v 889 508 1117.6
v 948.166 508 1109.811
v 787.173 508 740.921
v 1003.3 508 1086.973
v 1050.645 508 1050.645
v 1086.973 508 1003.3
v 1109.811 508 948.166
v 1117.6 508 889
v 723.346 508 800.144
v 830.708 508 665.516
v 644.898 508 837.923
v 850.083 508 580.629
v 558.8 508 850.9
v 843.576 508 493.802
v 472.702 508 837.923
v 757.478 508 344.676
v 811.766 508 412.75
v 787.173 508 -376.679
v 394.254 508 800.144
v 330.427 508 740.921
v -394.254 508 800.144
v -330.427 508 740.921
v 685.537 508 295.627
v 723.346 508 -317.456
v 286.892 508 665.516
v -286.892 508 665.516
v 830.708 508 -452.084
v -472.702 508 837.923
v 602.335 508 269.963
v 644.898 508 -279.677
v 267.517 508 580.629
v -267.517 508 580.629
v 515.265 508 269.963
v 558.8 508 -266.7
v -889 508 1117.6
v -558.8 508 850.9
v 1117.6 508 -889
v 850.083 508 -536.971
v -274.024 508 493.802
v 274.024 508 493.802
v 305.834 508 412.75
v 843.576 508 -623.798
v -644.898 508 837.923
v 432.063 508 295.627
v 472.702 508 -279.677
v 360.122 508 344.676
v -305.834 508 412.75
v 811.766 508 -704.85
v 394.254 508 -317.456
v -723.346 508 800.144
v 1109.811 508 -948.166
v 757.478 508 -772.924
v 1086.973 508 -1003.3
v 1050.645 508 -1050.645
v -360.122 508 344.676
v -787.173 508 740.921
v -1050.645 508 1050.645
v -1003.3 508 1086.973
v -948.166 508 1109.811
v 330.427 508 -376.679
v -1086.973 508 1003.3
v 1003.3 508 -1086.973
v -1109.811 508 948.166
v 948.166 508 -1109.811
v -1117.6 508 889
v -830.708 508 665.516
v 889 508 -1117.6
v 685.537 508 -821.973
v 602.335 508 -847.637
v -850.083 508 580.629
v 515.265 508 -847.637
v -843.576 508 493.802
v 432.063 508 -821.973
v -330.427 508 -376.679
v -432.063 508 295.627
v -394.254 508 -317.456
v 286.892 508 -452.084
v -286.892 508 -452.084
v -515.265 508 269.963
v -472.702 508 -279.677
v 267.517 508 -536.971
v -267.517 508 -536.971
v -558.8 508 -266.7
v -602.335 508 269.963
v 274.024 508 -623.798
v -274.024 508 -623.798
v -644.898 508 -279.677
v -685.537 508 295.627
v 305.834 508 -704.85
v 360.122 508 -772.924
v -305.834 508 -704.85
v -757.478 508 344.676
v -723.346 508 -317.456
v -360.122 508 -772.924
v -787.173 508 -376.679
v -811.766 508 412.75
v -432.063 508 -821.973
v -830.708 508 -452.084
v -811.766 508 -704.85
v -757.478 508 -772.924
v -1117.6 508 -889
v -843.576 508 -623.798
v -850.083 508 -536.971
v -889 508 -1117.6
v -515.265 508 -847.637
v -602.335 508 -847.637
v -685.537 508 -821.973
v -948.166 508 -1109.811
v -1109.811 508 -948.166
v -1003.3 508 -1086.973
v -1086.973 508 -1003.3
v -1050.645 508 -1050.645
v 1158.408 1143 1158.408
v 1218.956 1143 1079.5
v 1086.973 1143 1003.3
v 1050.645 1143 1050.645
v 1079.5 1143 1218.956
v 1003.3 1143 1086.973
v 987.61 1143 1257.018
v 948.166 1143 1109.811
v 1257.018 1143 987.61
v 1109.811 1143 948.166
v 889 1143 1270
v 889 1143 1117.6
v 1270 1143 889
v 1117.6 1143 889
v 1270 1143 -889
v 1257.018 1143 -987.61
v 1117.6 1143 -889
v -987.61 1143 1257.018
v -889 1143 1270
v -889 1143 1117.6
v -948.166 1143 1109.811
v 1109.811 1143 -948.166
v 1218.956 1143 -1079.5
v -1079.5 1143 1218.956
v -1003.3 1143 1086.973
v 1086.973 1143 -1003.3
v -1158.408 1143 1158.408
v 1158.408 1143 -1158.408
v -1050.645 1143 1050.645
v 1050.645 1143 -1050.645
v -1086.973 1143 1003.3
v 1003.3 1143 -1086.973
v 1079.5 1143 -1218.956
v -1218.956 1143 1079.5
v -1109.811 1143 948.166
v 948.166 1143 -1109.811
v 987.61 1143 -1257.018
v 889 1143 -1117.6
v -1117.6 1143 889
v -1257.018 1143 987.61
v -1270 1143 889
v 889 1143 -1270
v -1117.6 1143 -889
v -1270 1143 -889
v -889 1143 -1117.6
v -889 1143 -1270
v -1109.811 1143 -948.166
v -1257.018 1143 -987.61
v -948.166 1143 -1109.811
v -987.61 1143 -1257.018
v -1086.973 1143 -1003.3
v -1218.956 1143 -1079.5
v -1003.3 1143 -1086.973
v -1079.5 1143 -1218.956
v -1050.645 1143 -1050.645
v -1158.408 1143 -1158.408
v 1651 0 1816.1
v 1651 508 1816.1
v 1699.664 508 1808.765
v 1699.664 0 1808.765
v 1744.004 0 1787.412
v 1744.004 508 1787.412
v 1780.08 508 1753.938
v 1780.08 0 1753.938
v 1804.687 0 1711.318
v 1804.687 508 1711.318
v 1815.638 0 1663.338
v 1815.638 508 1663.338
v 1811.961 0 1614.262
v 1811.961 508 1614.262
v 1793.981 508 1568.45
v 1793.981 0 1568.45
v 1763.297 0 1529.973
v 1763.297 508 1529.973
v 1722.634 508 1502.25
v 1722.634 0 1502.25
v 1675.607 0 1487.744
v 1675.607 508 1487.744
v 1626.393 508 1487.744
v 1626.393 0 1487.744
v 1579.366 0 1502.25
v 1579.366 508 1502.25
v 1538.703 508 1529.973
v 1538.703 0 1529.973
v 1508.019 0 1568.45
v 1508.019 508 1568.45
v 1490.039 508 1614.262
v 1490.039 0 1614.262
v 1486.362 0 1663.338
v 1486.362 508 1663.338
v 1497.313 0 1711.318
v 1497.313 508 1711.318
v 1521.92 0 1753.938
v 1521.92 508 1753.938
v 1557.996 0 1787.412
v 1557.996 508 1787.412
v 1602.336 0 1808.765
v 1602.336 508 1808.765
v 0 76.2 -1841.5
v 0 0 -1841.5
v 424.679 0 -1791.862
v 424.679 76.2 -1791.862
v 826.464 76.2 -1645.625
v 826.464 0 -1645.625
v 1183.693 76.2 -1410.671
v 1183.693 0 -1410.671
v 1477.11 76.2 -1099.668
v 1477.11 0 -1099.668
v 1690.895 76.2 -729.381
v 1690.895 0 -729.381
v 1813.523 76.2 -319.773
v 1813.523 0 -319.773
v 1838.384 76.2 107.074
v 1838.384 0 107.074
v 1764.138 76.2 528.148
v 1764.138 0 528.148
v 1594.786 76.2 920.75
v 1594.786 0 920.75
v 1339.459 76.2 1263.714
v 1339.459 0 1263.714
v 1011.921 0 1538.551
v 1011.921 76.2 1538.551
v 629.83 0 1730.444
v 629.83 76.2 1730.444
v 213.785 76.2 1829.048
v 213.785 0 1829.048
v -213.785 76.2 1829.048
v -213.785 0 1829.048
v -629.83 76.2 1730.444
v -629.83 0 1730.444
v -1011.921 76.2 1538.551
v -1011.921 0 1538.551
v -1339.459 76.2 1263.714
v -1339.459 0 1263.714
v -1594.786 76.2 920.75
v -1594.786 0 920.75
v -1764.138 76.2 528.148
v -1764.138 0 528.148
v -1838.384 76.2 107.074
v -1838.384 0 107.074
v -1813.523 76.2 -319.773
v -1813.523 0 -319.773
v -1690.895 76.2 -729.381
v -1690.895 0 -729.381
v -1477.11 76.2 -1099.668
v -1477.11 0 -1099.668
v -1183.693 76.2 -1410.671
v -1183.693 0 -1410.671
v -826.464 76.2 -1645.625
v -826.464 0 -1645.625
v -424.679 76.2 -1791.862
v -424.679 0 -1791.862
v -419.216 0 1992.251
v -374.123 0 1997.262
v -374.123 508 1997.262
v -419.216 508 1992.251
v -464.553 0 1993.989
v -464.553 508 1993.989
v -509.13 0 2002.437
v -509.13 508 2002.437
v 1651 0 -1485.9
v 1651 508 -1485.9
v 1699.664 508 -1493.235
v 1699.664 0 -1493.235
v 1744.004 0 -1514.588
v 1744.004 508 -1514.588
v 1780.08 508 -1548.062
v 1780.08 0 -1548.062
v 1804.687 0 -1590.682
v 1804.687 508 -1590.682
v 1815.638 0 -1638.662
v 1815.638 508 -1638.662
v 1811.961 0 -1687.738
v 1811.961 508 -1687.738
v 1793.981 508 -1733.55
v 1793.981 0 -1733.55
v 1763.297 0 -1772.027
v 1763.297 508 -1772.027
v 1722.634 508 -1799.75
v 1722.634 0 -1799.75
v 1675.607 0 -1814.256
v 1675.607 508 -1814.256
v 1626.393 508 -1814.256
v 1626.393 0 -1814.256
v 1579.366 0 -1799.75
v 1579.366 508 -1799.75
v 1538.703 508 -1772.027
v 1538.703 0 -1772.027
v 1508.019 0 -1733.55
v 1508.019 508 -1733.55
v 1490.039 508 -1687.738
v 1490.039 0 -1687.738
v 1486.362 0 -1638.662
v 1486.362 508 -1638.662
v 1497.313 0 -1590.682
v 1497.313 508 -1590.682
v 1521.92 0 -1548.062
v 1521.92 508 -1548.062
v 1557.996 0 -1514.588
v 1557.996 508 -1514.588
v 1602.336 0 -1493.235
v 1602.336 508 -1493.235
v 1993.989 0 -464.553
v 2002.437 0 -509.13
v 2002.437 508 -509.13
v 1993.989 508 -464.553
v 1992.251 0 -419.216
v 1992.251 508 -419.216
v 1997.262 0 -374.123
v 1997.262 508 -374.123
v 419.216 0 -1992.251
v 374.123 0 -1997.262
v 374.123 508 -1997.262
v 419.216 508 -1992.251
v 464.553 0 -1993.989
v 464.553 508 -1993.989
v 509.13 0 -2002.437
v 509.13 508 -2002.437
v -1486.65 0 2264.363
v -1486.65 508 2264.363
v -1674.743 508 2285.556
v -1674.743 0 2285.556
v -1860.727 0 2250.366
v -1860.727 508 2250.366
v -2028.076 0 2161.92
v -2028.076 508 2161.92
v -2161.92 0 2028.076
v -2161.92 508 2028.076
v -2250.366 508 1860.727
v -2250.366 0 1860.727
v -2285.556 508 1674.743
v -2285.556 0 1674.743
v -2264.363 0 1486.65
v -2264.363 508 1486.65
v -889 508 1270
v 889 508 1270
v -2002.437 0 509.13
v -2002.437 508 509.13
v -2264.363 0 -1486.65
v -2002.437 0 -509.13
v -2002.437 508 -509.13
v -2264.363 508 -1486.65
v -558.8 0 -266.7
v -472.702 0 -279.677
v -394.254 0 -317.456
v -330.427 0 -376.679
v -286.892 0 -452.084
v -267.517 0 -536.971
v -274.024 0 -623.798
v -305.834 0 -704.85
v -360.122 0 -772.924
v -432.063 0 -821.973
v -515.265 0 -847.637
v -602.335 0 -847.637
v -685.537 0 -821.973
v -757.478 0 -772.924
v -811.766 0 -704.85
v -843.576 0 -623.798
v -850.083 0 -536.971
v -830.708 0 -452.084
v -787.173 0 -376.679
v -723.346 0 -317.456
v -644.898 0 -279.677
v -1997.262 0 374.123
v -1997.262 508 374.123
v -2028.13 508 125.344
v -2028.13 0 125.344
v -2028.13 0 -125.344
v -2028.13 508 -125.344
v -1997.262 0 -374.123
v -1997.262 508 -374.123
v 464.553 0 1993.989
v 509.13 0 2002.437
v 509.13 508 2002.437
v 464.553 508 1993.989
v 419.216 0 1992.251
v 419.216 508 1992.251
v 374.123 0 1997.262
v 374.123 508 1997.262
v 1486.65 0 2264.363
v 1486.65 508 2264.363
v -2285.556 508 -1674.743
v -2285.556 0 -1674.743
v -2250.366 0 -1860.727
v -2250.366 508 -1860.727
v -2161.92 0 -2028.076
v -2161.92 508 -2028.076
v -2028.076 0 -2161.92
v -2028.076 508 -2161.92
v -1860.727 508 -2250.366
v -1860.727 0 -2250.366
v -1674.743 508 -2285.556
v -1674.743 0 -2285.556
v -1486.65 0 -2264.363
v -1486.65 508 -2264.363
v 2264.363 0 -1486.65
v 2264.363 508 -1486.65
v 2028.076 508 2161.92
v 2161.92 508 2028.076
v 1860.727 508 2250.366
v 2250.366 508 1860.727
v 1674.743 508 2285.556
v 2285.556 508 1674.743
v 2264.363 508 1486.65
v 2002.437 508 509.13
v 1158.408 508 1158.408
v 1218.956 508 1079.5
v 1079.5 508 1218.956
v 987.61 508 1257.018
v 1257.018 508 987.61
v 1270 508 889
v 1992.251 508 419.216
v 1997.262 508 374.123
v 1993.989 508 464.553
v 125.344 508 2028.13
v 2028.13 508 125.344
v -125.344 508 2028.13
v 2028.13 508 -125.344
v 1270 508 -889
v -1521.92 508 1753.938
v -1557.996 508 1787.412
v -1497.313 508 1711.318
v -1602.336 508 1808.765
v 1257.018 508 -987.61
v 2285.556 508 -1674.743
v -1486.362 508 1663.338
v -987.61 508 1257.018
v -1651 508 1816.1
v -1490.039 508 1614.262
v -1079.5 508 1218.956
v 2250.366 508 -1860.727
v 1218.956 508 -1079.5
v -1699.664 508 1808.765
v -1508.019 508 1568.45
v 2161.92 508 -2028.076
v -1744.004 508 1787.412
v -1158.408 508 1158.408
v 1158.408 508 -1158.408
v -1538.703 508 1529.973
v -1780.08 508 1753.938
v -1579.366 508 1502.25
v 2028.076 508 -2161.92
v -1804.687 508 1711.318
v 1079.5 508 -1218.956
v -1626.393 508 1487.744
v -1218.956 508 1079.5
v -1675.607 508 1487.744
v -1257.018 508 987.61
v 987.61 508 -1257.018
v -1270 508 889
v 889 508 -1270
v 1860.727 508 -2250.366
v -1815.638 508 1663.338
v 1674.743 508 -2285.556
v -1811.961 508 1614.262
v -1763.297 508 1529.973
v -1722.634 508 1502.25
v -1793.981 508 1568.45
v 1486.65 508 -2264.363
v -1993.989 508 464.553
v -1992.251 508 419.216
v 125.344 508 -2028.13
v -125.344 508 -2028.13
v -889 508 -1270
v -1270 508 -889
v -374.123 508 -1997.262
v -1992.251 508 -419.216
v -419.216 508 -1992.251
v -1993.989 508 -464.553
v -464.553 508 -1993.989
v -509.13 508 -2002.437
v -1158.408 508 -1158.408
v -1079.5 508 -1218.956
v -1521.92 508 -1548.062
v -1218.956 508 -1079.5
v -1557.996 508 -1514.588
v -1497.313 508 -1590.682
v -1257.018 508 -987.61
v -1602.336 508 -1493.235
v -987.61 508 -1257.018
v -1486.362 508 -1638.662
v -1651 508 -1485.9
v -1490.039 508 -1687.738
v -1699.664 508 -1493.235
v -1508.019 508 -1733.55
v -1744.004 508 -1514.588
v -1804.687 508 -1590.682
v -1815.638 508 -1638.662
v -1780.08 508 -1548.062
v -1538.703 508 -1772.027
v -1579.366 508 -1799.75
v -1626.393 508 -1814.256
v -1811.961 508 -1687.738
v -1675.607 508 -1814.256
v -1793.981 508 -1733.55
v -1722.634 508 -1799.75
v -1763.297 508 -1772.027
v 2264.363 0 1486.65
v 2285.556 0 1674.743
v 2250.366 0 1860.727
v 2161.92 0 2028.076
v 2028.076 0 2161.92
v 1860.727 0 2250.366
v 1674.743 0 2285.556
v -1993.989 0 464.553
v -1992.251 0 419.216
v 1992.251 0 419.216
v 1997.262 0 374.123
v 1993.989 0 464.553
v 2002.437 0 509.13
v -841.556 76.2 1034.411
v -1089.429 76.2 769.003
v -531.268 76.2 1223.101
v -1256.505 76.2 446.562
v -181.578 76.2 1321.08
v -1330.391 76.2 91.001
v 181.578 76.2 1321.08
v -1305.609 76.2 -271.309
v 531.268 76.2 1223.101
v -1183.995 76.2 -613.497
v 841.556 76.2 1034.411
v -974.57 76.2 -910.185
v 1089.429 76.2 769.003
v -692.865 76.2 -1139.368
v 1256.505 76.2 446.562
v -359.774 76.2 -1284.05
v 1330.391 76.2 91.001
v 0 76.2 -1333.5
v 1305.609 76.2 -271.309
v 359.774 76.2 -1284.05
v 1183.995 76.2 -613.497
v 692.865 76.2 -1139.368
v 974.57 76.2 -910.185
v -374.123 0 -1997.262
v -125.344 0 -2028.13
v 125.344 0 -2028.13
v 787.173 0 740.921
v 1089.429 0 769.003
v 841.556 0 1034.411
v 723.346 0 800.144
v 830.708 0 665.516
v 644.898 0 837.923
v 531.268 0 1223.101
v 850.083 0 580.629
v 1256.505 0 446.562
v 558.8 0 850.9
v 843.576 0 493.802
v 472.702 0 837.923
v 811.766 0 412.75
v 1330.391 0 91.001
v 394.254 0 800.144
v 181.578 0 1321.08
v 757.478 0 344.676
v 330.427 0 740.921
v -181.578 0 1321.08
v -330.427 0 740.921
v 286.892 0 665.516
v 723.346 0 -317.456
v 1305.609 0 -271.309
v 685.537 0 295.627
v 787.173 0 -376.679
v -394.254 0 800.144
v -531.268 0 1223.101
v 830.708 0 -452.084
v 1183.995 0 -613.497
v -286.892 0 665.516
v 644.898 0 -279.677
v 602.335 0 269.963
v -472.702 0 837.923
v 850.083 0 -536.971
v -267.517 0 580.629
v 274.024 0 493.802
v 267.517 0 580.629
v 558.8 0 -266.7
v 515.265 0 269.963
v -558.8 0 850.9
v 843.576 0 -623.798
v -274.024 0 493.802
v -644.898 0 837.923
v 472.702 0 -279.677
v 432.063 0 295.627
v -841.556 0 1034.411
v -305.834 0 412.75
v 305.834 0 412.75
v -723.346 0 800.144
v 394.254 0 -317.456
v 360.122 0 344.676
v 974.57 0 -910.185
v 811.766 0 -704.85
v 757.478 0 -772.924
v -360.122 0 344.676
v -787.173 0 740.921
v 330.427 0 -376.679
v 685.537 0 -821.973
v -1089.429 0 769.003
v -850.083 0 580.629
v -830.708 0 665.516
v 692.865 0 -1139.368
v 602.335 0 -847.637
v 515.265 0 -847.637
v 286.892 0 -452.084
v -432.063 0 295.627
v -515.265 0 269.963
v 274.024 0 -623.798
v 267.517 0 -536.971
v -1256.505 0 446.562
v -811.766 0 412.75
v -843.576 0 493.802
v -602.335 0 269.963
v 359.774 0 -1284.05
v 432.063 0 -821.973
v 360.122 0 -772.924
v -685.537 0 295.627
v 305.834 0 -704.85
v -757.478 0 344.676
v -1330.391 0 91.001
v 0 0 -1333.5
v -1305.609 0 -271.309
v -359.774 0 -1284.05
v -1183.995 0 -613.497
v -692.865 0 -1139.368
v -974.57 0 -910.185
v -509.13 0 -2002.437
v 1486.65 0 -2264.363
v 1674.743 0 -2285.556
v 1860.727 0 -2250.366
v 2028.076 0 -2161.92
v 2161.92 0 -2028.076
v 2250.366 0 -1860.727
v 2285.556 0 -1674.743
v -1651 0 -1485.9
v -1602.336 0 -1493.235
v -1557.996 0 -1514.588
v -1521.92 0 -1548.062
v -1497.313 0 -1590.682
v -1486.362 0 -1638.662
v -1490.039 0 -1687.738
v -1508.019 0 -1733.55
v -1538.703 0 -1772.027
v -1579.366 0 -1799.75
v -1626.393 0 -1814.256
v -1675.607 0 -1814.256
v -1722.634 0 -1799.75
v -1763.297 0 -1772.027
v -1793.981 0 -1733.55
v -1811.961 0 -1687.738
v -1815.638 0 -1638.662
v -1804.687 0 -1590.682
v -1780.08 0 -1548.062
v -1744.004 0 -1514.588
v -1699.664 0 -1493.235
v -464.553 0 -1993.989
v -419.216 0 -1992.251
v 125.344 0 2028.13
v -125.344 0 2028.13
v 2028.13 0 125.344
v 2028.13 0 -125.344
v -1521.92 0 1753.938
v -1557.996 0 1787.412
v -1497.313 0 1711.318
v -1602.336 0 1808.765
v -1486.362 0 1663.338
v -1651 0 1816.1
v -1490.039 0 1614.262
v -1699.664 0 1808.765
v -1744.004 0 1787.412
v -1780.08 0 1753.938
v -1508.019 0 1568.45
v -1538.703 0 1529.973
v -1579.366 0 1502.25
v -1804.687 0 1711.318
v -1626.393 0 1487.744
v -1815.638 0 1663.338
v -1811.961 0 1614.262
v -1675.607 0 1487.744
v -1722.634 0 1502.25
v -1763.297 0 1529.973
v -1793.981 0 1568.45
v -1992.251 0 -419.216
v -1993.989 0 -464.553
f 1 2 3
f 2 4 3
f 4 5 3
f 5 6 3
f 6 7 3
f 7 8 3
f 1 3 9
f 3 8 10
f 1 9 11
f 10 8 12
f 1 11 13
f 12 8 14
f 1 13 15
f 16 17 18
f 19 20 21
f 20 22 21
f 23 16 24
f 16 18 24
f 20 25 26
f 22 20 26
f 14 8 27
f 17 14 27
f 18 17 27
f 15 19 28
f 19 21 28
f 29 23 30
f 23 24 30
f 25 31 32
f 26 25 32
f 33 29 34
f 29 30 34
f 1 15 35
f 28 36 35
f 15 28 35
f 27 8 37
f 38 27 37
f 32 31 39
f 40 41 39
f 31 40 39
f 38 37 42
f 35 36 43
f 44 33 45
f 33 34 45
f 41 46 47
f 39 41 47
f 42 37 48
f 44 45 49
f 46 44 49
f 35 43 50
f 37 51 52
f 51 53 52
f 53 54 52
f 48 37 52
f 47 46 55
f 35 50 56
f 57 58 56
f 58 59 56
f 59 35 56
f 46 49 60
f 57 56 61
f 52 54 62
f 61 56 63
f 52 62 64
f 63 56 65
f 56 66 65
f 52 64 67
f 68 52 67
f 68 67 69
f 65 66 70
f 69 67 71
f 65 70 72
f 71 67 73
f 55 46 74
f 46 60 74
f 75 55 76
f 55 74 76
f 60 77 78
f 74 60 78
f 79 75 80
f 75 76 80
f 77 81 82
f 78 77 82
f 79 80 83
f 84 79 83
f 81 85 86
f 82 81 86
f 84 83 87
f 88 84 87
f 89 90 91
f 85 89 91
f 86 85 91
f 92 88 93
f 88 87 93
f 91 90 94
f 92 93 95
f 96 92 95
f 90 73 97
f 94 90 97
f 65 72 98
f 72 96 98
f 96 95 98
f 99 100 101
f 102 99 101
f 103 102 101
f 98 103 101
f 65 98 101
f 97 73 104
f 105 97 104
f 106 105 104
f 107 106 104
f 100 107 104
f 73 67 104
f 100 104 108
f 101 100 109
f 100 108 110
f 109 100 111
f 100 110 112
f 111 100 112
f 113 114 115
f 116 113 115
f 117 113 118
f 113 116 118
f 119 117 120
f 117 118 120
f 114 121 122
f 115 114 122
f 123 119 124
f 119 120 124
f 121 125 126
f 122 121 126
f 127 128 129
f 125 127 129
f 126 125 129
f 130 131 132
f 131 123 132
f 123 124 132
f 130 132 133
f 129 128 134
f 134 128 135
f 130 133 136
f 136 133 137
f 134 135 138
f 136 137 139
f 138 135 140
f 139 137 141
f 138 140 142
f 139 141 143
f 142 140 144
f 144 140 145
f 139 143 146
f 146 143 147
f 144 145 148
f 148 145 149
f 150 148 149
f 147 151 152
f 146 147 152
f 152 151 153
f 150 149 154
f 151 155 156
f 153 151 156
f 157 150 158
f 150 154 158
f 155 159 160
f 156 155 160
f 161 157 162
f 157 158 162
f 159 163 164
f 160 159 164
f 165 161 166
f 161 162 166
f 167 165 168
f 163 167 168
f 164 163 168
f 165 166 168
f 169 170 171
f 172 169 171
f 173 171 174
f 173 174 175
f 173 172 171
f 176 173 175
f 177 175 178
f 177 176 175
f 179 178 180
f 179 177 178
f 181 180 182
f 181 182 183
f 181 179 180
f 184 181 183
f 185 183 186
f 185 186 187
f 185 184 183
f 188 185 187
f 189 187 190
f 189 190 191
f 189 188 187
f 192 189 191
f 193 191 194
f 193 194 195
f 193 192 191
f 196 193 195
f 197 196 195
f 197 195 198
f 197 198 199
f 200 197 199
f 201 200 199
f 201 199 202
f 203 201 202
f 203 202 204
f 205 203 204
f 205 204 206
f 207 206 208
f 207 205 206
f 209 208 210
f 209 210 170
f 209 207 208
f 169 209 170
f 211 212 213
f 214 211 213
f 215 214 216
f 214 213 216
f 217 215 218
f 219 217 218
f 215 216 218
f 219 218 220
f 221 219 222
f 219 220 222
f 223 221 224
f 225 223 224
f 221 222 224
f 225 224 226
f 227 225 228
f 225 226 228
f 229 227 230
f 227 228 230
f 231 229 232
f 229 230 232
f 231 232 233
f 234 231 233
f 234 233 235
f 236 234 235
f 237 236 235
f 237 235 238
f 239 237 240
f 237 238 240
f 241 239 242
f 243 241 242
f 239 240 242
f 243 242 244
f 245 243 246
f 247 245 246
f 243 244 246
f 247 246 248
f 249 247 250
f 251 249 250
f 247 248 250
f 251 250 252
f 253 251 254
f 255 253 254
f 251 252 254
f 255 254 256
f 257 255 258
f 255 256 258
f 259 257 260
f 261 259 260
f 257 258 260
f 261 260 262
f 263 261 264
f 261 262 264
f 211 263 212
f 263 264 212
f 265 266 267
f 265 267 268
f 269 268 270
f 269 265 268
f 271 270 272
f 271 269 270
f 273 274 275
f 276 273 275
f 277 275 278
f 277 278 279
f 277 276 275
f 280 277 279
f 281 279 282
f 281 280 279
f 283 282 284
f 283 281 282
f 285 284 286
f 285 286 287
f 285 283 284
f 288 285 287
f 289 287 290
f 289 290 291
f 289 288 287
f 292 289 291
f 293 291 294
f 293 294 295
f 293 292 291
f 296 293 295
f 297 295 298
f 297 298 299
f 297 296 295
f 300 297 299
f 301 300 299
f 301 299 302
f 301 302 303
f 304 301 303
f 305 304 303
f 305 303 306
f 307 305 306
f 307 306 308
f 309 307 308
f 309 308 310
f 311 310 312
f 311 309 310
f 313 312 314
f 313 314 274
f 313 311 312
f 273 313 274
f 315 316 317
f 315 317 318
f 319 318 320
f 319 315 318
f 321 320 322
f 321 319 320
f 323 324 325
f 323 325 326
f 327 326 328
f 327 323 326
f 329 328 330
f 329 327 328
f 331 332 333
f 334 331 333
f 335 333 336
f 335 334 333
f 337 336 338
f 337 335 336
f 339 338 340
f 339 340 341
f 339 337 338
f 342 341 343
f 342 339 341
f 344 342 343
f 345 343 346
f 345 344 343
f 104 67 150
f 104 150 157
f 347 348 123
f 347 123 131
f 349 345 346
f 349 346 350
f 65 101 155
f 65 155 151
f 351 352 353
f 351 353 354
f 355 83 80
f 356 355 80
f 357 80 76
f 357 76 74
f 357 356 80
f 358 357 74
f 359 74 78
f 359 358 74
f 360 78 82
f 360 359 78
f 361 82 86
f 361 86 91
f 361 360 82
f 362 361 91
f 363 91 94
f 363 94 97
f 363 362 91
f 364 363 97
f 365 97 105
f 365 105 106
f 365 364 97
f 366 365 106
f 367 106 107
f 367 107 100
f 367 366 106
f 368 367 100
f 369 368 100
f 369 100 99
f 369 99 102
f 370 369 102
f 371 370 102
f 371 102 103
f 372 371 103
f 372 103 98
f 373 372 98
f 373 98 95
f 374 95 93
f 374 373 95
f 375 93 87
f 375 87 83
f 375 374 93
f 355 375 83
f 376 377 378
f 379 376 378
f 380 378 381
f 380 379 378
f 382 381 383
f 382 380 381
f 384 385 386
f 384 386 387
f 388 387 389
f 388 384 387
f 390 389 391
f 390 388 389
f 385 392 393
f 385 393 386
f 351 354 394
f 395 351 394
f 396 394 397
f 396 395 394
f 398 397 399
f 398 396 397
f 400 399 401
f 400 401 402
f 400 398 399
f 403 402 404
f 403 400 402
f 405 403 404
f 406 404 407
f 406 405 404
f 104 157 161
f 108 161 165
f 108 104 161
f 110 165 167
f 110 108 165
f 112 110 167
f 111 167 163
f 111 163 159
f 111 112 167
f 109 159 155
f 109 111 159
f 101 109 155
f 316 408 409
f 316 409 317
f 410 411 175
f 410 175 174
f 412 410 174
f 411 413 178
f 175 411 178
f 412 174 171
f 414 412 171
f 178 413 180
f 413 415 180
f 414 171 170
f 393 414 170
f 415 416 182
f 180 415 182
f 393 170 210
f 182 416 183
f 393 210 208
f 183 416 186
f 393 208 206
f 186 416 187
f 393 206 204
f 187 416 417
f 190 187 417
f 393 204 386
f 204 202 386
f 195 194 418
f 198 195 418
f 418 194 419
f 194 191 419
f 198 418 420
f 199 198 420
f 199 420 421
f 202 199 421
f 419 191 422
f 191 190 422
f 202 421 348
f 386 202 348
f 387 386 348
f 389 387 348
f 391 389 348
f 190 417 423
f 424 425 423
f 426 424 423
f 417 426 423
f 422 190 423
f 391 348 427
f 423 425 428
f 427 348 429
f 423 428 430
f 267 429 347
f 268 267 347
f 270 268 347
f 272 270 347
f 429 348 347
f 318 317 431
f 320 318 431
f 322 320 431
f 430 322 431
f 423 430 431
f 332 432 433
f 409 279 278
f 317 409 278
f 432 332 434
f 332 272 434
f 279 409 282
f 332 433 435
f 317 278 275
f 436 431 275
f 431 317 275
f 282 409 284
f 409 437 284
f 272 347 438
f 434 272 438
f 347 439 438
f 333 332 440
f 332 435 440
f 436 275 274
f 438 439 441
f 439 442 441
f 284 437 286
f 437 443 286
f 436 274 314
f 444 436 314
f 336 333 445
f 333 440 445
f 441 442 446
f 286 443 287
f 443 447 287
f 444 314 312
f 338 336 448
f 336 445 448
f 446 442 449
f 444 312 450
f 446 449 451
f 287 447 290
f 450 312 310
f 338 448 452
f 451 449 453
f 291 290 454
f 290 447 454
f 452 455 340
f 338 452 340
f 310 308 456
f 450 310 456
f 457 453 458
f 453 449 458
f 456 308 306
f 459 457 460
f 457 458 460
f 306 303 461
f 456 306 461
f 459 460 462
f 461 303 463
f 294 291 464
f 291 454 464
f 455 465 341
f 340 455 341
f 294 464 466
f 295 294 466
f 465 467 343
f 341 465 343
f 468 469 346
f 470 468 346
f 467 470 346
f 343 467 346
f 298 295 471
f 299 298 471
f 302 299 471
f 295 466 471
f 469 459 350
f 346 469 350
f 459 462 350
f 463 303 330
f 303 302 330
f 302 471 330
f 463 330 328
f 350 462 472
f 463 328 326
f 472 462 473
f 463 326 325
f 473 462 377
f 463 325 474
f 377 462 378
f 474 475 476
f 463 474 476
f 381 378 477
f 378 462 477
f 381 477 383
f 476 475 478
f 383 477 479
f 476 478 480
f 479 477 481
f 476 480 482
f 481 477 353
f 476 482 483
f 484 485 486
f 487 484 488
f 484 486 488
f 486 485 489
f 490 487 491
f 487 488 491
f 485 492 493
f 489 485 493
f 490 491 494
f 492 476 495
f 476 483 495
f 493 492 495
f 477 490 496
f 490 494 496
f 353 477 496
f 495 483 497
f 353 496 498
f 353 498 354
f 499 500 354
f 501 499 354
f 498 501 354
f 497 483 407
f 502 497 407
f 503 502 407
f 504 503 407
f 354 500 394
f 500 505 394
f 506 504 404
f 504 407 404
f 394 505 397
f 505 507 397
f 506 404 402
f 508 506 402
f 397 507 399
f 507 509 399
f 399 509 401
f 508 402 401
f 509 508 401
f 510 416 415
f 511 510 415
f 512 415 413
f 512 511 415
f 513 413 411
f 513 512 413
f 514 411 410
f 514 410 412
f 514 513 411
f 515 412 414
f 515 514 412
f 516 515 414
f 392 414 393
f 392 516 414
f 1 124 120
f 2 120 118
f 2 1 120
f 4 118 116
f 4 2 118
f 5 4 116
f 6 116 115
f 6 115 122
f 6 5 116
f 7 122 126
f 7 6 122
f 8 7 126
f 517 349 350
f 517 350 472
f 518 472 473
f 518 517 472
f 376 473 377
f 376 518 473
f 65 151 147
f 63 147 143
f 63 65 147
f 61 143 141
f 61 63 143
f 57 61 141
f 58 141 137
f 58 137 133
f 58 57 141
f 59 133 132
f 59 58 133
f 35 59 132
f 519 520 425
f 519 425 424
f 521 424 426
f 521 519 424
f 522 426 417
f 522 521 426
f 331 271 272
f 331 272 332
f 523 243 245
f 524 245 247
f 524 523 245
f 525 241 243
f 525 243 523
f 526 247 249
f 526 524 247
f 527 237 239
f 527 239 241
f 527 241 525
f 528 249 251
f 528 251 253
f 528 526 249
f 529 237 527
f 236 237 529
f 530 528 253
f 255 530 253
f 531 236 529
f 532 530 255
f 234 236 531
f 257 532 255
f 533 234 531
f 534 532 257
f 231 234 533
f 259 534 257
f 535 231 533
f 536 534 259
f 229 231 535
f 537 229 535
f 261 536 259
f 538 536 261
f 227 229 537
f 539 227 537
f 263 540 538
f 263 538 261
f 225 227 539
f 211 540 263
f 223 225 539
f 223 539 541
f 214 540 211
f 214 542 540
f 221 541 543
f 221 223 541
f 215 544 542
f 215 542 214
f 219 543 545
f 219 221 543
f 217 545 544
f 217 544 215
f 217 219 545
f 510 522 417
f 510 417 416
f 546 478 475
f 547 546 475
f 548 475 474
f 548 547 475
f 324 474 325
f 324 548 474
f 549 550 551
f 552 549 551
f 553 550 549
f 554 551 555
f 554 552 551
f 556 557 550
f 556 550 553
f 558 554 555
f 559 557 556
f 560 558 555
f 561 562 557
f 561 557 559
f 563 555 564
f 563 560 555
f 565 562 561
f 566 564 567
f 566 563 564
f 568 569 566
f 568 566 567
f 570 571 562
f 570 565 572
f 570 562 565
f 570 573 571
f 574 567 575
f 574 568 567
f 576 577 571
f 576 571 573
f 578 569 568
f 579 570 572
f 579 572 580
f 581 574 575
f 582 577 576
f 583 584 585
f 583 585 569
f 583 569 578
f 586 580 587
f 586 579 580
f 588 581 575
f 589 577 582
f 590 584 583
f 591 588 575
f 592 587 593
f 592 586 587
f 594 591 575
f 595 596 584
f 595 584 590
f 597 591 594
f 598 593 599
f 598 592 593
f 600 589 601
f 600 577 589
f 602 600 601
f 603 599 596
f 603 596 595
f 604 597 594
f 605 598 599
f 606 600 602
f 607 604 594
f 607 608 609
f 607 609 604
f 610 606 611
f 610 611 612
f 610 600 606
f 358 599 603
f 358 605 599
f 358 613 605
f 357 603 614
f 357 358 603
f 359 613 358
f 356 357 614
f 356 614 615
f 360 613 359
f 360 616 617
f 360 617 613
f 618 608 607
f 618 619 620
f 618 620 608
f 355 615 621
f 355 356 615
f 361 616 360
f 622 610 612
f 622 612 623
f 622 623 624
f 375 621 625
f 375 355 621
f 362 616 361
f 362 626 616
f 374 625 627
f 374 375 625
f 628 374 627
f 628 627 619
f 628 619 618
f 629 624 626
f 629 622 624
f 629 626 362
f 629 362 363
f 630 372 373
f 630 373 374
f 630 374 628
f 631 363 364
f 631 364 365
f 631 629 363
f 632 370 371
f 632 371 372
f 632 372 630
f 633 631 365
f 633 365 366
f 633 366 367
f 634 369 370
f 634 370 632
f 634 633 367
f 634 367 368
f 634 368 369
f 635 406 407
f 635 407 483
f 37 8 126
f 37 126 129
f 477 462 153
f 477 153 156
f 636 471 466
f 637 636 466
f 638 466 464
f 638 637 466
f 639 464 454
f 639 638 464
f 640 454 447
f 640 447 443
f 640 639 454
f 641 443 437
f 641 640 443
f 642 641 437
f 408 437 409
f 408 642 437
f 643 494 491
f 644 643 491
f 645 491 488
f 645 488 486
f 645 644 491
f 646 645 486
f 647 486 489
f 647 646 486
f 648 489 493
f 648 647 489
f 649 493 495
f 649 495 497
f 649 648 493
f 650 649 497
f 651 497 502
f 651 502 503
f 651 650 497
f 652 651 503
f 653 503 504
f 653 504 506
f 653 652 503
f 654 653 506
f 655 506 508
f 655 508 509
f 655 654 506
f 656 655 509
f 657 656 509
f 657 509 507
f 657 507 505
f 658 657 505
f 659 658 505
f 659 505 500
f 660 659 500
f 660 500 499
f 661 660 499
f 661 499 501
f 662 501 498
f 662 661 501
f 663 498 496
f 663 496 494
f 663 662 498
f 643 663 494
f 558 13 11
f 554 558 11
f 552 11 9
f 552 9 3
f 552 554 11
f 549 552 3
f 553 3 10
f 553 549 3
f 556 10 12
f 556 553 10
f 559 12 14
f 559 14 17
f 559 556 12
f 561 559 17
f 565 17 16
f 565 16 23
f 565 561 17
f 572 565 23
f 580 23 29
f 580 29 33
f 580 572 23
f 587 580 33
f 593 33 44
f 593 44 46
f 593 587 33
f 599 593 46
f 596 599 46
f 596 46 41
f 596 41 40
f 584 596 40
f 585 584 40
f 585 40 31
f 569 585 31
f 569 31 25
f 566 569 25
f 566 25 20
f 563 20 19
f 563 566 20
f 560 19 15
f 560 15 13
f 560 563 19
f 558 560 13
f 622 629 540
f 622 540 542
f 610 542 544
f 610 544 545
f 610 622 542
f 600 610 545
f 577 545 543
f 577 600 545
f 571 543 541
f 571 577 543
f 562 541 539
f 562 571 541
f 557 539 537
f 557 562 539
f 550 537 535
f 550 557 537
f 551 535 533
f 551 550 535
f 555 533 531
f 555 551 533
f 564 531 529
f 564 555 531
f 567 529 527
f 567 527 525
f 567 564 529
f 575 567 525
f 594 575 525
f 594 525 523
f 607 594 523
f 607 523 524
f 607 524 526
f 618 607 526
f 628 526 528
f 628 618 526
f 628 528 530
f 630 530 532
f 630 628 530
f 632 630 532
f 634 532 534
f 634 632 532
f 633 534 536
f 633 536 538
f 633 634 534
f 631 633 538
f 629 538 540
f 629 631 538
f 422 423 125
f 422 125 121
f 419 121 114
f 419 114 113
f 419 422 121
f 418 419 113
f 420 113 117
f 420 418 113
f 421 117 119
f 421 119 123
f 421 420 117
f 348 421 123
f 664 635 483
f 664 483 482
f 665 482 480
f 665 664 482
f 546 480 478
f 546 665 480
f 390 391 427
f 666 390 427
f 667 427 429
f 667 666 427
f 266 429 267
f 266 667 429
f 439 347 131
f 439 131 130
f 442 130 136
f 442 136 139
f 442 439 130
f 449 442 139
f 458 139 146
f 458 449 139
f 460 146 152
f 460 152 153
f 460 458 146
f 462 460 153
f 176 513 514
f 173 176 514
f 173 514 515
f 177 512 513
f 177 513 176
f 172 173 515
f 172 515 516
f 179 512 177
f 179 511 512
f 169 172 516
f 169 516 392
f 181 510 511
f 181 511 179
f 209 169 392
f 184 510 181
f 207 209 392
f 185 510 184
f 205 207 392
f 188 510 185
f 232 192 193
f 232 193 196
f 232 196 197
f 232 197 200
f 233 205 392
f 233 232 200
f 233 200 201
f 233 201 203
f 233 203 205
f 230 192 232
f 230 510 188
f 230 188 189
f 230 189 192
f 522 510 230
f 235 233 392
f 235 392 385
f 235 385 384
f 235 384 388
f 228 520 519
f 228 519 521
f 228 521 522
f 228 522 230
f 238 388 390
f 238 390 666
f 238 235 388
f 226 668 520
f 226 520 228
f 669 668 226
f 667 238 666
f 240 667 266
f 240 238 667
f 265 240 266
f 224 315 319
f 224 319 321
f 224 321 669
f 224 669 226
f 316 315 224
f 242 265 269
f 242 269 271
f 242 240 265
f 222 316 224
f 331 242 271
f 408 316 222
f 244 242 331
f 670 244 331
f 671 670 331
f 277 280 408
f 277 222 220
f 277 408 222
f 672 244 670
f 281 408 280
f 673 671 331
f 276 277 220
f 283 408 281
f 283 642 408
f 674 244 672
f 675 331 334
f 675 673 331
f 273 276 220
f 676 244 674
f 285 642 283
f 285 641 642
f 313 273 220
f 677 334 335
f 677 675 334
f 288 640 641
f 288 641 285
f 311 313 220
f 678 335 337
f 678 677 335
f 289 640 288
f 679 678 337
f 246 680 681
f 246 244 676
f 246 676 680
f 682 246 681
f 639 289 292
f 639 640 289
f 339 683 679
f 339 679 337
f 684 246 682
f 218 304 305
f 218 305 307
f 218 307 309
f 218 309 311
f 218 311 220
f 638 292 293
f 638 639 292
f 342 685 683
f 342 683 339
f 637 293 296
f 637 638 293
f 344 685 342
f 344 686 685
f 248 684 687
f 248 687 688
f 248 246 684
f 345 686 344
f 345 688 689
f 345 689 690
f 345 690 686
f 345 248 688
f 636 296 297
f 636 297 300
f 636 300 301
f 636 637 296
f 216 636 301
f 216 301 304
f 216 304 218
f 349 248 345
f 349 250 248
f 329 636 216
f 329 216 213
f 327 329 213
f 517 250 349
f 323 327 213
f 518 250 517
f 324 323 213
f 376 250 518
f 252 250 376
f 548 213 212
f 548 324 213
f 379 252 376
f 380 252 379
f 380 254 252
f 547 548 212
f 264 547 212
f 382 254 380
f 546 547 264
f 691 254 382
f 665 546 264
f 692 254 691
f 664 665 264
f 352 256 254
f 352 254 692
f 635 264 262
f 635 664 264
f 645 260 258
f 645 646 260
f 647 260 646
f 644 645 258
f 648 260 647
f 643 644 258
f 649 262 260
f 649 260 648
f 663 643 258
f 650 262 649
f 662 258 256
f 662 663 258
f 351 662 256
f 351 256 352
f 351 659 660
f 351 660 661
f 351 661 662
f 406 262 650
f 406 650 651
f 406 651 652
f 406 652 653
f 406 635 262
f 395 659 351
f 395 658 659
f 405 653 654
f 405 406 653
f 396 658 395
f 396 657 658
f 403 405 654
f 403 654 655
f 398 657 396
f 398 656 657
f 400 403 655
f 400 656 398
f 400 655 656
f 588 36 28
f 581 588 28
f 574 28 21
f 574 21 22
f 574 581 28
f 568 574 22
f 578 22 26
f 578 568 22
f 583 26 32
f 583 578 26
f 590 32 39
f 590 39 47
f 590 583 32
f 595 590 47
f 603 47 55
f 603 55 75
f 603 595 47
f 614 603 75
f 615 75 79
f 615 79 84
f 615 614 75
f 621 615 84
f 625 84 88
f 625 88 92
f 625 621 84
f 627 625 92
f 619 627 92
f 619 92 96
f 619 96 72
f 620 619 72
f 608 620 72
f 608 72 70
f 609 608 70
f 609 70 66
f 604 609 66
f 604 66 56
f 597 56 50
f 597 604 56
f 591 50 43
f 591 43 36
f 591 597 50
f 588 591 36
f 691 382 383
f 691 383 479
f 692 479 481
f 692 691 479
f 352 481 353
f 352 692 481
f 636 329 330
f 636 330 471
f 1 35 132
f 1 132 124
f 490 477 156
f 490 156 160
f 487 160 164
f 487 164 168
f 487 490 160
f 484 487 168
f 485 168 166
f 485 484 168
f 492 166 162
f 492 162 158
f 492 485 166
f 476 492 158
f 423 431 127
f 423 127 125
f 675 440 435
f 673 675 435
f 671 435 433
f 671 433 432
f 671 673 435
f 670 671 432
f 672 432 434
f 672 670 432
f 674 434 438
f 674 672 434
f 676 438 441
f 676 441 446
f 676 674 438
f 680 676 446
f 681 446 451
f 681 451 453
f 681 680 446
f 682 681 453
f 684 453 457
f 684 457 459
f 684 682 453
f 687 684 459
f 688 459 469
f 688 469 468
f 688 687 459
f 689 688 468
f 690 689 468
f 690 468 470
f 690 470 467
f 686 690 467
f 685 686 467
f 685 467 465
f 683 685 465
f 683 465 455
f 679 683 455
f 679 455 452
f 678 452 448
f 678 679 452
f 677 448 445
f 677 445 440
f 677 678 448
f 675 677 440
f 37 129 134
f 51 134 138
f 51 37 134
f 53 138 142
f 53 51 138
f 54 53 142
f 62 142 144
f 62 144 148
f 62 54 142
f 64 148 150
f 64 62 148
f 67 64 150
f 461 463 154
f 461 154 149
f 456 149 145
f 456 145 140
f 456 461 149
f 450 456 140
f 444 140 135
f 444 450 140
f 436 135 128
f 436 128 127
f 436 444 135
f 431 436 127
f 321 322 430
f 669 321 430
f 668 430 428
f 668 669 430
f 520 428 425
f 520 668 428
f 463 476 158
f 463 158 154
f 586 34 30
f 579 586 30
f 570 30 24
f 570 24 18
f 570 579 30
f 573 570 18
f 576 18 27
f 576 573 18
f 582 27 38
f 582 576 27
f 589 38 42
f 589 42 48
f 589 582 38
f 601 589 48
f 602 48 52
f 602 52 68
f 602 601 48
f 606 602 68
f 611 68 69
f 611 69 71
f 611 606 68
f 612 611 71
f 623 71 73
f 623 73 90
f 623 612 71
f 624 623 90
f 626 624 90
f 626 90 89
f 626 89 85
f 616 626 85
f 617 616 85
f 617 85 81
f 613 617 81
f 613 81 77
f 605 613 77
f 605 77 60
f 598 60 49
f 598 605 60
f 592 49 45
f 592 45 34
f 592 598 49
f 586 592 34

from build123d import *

# Parameters (mm, degrees)
SKETCH1_R           = 292.1
SKETCH1_R_2         = 165.1
BOSS_EXTRUDE1_DEPTH = 508
BOSS_EXTRUDE2_START = 508
BOSS_EXTRUDE2_DEPTH = 635
SKETCH2_R           = 1841.5
SKETCH2_R_2         = 1333.5
CUT_EXTRUDE1_DEPTH  = 76.2


with BuildPart() as part:
    # Sketch1 → Boss-Extrude1 (new body)
    with BuildSketch(Plane(origin=(0, 0, 0), x_dir=(1, 0, 0), z_dir=(0, 1, 0))):
        with BuildLine():
            Line((-509.129830316, 2002.437184733), (-1486.64990636, 2264.362899694))
            ThreePointArc((-1486.64990636, 2264.362899694), (-2100.012806053, 2100.012806053), (-2264.362899694, 1486.64990636))
            Line((-2264.362899694, 1486.64990636), (-2002.437184733, 509.129830316))
            ThreePointArc((-2002.437184733, 509.129830316), (-1992.275061974, 441.916911811), (-1997.262066596, 374.123291625))
            ThreePointArc((-1997.262066596, 374.123291625), (-2032, 0), (-1997.262066596, -374.123291625))
            ThreePointArc((-1997.262066596, -374.123291625), (-1992.275061974, -441.916911811), (-2002.437184733, -509.129830316))
            Line((-2002.437184733, -509.129830316), (-2264.362899694, -1486.64990636))
            ThreePointArc((-2264.362899694, -1486.64990636), (-2100.012806053, -2100.012806053), (-1486.64990636, -2264.362899694))
            Line((-1486.64990636, -2264.362899694), (-509.129830316, -2002.437184733))
            ThreePointArc((-509.129830316, -2002.437184733), (-441.916911811, -1992.275061974), (-374.123291625, -1997.262066596))
            ThreePointArc((-374.123291625, -1997.262066596), (0, -2032), (374.123291625, -1997.262066596))
            ThreePointArc((374.123291625, -1997.262066596), (441.916911811, -1992.275061974), (509.129830316, -2002.437184733))
            Line((509.129830316, -2002.437184733), (1486.64990636, -2264.362899694))
            ThreePointArc((1486.64990636, -2264.362899694), (2100.012806053, -2100.012806053), (2264.362899694, -1486.64990636))
            Line((2264.362899694, -1486.64990636), (2002.437184733, -509.129830316))
            ThreePointArc((2002.437184733, -509.129830316), (1992.275061974, -441.916911811), (1997.262066596, -374.123291625))
            ThreePointArc((1997.262066596, -374.123291625), (2032, 0), (1997.262066596, 374.123291625))
            ThreePointArc((1997.262066596, 374.123291625), (1992.275061974, 441.916911811), (2002.437184733, 509.129830316))
            Line((2002.437184733, 509.129830316), (2264.362899694, 1486.64990636))
            ThreePointArc((2264.362899694, 1486.64990636), (2100.012806053, 2100.012806053), (1486.64990636, 2264.362899694))
            Line((1486.64990636, 2264.362899694), (509.129830316, 2002.437184733))
            ThreePointArc((509.129830316, 2002.437184733), (441.916911811, 1992.275061974), (374.123291625, 1997.262066596))
            ThreePointArc((374.123291625, 1997.262066596), (0, 2032), (-374.123291625, 1997.262066596))
            ThreePointArc((-374.123291625, 1997.262066596), (-441.916911811, 1992.275061974), (-509.129830316, 2002.437184733))
        make_face()
        with Locations((-558.8, -558.8)):
            Circle(SKETCH1_R, mode=Mode.SUBTRACT)
        with Locations((558.8, -558.8)):
            Circle(SKETCH1_R, mode=Mode.SUBTRACT)
        with Locations((-558.8, 558.8)):
            Circle(SKETCH1_R, mode=Mode.SUBTRACT)
        with Locations((558.8, 558.8)):
            Circle(SKETCH1_R, mode=Mode.SUBTRACT)
        with Locations((-1651, -1651)):
            Circle(SKETCH1_R_2, mode=Mode.SUBTRACT)
        with Locations((1651, -1651)):
            Circle(SKETCH1_R_2, mode=Mode.SUBTRACT)
        with Locations((-1651, 1651)):
            Circle(SKETCH1_R_2, mode=Mode.SUBTRACT)
        with Locations((1651, 1651)):
            Circle(SKETCH1_R_2, mode=Mode.SUBTRACT)
    extrude(amount=BOSS_EXTRUDE1_DEPTH)

    # Sketch1<3> → Boss-Extrude2 (add)
    with BuildSketch(Plane(origin=(0, 0, 0), x_dir=(1, 0, 0), z_dir=(0, 1, 0)).offset(BOSS_EXTRUDE2_START)):
        with BuildLine():
            ThreePointArc((-1270, -889), (-1158.407683632, -1158.407683632), (-889, -1270))
            Line((-889, -1270), (889, -1270))
            ThreePointArc((889, -1270), (1158.407683632, -1158.407683632), (1270, -889))
            Line((1270, -889), (1270, 889))
            ThreePointArc((1270, 889), (1158.407683632, 1158.407683632), (889, 1270))
            Line((889, 1270), (-889, 1270))
            ThreePointArc((-889, 1270), (-1158.407683632, 1158.407683632), (-1270, 889))
            Line((-1270, 889), (-1270, -889))
        make_face()
        with BuildLine():
            ThreePointArc((-1117.6, 889), (-1050.644610179, 1050.644610179), (-889, 1117.6))
            Line((-889, 1117.6), (889, 1117.6))
            ThreePointArc((889, 1117.6), (1050.644610179, 1050.644610179), (1117.6, 889))
            Line((1117.6, 889), (1117.6, -889))
            ThreePointArc((1117.6, -889), (1050.644610179, -1050.644610179), (889, -1117.6))
            Line((889, -1117.6), (-889, -1117.6))
            ThreePointArc((-889, -1117.6), (-1050.644610179, -1050.644610179), (-1117.6, -889))
            Line((-1117.6, -889), (-1117.6, 889))
        make_face(mode=Mode.SUBTRACT)
    extrude(amount=BOSS_EXTRUDE2_DEPTH)

    # Sketch2 → Cut-Extrude1 (cut)
    with BuildSketch(Plane.XZ):
        Circle(SKETCH2_R)
        Circle(SKETCH2_R_2, mode=Mode.SUBTRACT)
    extrude(amount=-CUT_EXTRUDE1_DEPTH, mode=Mode.SUBTRACT)


solid = part.part
